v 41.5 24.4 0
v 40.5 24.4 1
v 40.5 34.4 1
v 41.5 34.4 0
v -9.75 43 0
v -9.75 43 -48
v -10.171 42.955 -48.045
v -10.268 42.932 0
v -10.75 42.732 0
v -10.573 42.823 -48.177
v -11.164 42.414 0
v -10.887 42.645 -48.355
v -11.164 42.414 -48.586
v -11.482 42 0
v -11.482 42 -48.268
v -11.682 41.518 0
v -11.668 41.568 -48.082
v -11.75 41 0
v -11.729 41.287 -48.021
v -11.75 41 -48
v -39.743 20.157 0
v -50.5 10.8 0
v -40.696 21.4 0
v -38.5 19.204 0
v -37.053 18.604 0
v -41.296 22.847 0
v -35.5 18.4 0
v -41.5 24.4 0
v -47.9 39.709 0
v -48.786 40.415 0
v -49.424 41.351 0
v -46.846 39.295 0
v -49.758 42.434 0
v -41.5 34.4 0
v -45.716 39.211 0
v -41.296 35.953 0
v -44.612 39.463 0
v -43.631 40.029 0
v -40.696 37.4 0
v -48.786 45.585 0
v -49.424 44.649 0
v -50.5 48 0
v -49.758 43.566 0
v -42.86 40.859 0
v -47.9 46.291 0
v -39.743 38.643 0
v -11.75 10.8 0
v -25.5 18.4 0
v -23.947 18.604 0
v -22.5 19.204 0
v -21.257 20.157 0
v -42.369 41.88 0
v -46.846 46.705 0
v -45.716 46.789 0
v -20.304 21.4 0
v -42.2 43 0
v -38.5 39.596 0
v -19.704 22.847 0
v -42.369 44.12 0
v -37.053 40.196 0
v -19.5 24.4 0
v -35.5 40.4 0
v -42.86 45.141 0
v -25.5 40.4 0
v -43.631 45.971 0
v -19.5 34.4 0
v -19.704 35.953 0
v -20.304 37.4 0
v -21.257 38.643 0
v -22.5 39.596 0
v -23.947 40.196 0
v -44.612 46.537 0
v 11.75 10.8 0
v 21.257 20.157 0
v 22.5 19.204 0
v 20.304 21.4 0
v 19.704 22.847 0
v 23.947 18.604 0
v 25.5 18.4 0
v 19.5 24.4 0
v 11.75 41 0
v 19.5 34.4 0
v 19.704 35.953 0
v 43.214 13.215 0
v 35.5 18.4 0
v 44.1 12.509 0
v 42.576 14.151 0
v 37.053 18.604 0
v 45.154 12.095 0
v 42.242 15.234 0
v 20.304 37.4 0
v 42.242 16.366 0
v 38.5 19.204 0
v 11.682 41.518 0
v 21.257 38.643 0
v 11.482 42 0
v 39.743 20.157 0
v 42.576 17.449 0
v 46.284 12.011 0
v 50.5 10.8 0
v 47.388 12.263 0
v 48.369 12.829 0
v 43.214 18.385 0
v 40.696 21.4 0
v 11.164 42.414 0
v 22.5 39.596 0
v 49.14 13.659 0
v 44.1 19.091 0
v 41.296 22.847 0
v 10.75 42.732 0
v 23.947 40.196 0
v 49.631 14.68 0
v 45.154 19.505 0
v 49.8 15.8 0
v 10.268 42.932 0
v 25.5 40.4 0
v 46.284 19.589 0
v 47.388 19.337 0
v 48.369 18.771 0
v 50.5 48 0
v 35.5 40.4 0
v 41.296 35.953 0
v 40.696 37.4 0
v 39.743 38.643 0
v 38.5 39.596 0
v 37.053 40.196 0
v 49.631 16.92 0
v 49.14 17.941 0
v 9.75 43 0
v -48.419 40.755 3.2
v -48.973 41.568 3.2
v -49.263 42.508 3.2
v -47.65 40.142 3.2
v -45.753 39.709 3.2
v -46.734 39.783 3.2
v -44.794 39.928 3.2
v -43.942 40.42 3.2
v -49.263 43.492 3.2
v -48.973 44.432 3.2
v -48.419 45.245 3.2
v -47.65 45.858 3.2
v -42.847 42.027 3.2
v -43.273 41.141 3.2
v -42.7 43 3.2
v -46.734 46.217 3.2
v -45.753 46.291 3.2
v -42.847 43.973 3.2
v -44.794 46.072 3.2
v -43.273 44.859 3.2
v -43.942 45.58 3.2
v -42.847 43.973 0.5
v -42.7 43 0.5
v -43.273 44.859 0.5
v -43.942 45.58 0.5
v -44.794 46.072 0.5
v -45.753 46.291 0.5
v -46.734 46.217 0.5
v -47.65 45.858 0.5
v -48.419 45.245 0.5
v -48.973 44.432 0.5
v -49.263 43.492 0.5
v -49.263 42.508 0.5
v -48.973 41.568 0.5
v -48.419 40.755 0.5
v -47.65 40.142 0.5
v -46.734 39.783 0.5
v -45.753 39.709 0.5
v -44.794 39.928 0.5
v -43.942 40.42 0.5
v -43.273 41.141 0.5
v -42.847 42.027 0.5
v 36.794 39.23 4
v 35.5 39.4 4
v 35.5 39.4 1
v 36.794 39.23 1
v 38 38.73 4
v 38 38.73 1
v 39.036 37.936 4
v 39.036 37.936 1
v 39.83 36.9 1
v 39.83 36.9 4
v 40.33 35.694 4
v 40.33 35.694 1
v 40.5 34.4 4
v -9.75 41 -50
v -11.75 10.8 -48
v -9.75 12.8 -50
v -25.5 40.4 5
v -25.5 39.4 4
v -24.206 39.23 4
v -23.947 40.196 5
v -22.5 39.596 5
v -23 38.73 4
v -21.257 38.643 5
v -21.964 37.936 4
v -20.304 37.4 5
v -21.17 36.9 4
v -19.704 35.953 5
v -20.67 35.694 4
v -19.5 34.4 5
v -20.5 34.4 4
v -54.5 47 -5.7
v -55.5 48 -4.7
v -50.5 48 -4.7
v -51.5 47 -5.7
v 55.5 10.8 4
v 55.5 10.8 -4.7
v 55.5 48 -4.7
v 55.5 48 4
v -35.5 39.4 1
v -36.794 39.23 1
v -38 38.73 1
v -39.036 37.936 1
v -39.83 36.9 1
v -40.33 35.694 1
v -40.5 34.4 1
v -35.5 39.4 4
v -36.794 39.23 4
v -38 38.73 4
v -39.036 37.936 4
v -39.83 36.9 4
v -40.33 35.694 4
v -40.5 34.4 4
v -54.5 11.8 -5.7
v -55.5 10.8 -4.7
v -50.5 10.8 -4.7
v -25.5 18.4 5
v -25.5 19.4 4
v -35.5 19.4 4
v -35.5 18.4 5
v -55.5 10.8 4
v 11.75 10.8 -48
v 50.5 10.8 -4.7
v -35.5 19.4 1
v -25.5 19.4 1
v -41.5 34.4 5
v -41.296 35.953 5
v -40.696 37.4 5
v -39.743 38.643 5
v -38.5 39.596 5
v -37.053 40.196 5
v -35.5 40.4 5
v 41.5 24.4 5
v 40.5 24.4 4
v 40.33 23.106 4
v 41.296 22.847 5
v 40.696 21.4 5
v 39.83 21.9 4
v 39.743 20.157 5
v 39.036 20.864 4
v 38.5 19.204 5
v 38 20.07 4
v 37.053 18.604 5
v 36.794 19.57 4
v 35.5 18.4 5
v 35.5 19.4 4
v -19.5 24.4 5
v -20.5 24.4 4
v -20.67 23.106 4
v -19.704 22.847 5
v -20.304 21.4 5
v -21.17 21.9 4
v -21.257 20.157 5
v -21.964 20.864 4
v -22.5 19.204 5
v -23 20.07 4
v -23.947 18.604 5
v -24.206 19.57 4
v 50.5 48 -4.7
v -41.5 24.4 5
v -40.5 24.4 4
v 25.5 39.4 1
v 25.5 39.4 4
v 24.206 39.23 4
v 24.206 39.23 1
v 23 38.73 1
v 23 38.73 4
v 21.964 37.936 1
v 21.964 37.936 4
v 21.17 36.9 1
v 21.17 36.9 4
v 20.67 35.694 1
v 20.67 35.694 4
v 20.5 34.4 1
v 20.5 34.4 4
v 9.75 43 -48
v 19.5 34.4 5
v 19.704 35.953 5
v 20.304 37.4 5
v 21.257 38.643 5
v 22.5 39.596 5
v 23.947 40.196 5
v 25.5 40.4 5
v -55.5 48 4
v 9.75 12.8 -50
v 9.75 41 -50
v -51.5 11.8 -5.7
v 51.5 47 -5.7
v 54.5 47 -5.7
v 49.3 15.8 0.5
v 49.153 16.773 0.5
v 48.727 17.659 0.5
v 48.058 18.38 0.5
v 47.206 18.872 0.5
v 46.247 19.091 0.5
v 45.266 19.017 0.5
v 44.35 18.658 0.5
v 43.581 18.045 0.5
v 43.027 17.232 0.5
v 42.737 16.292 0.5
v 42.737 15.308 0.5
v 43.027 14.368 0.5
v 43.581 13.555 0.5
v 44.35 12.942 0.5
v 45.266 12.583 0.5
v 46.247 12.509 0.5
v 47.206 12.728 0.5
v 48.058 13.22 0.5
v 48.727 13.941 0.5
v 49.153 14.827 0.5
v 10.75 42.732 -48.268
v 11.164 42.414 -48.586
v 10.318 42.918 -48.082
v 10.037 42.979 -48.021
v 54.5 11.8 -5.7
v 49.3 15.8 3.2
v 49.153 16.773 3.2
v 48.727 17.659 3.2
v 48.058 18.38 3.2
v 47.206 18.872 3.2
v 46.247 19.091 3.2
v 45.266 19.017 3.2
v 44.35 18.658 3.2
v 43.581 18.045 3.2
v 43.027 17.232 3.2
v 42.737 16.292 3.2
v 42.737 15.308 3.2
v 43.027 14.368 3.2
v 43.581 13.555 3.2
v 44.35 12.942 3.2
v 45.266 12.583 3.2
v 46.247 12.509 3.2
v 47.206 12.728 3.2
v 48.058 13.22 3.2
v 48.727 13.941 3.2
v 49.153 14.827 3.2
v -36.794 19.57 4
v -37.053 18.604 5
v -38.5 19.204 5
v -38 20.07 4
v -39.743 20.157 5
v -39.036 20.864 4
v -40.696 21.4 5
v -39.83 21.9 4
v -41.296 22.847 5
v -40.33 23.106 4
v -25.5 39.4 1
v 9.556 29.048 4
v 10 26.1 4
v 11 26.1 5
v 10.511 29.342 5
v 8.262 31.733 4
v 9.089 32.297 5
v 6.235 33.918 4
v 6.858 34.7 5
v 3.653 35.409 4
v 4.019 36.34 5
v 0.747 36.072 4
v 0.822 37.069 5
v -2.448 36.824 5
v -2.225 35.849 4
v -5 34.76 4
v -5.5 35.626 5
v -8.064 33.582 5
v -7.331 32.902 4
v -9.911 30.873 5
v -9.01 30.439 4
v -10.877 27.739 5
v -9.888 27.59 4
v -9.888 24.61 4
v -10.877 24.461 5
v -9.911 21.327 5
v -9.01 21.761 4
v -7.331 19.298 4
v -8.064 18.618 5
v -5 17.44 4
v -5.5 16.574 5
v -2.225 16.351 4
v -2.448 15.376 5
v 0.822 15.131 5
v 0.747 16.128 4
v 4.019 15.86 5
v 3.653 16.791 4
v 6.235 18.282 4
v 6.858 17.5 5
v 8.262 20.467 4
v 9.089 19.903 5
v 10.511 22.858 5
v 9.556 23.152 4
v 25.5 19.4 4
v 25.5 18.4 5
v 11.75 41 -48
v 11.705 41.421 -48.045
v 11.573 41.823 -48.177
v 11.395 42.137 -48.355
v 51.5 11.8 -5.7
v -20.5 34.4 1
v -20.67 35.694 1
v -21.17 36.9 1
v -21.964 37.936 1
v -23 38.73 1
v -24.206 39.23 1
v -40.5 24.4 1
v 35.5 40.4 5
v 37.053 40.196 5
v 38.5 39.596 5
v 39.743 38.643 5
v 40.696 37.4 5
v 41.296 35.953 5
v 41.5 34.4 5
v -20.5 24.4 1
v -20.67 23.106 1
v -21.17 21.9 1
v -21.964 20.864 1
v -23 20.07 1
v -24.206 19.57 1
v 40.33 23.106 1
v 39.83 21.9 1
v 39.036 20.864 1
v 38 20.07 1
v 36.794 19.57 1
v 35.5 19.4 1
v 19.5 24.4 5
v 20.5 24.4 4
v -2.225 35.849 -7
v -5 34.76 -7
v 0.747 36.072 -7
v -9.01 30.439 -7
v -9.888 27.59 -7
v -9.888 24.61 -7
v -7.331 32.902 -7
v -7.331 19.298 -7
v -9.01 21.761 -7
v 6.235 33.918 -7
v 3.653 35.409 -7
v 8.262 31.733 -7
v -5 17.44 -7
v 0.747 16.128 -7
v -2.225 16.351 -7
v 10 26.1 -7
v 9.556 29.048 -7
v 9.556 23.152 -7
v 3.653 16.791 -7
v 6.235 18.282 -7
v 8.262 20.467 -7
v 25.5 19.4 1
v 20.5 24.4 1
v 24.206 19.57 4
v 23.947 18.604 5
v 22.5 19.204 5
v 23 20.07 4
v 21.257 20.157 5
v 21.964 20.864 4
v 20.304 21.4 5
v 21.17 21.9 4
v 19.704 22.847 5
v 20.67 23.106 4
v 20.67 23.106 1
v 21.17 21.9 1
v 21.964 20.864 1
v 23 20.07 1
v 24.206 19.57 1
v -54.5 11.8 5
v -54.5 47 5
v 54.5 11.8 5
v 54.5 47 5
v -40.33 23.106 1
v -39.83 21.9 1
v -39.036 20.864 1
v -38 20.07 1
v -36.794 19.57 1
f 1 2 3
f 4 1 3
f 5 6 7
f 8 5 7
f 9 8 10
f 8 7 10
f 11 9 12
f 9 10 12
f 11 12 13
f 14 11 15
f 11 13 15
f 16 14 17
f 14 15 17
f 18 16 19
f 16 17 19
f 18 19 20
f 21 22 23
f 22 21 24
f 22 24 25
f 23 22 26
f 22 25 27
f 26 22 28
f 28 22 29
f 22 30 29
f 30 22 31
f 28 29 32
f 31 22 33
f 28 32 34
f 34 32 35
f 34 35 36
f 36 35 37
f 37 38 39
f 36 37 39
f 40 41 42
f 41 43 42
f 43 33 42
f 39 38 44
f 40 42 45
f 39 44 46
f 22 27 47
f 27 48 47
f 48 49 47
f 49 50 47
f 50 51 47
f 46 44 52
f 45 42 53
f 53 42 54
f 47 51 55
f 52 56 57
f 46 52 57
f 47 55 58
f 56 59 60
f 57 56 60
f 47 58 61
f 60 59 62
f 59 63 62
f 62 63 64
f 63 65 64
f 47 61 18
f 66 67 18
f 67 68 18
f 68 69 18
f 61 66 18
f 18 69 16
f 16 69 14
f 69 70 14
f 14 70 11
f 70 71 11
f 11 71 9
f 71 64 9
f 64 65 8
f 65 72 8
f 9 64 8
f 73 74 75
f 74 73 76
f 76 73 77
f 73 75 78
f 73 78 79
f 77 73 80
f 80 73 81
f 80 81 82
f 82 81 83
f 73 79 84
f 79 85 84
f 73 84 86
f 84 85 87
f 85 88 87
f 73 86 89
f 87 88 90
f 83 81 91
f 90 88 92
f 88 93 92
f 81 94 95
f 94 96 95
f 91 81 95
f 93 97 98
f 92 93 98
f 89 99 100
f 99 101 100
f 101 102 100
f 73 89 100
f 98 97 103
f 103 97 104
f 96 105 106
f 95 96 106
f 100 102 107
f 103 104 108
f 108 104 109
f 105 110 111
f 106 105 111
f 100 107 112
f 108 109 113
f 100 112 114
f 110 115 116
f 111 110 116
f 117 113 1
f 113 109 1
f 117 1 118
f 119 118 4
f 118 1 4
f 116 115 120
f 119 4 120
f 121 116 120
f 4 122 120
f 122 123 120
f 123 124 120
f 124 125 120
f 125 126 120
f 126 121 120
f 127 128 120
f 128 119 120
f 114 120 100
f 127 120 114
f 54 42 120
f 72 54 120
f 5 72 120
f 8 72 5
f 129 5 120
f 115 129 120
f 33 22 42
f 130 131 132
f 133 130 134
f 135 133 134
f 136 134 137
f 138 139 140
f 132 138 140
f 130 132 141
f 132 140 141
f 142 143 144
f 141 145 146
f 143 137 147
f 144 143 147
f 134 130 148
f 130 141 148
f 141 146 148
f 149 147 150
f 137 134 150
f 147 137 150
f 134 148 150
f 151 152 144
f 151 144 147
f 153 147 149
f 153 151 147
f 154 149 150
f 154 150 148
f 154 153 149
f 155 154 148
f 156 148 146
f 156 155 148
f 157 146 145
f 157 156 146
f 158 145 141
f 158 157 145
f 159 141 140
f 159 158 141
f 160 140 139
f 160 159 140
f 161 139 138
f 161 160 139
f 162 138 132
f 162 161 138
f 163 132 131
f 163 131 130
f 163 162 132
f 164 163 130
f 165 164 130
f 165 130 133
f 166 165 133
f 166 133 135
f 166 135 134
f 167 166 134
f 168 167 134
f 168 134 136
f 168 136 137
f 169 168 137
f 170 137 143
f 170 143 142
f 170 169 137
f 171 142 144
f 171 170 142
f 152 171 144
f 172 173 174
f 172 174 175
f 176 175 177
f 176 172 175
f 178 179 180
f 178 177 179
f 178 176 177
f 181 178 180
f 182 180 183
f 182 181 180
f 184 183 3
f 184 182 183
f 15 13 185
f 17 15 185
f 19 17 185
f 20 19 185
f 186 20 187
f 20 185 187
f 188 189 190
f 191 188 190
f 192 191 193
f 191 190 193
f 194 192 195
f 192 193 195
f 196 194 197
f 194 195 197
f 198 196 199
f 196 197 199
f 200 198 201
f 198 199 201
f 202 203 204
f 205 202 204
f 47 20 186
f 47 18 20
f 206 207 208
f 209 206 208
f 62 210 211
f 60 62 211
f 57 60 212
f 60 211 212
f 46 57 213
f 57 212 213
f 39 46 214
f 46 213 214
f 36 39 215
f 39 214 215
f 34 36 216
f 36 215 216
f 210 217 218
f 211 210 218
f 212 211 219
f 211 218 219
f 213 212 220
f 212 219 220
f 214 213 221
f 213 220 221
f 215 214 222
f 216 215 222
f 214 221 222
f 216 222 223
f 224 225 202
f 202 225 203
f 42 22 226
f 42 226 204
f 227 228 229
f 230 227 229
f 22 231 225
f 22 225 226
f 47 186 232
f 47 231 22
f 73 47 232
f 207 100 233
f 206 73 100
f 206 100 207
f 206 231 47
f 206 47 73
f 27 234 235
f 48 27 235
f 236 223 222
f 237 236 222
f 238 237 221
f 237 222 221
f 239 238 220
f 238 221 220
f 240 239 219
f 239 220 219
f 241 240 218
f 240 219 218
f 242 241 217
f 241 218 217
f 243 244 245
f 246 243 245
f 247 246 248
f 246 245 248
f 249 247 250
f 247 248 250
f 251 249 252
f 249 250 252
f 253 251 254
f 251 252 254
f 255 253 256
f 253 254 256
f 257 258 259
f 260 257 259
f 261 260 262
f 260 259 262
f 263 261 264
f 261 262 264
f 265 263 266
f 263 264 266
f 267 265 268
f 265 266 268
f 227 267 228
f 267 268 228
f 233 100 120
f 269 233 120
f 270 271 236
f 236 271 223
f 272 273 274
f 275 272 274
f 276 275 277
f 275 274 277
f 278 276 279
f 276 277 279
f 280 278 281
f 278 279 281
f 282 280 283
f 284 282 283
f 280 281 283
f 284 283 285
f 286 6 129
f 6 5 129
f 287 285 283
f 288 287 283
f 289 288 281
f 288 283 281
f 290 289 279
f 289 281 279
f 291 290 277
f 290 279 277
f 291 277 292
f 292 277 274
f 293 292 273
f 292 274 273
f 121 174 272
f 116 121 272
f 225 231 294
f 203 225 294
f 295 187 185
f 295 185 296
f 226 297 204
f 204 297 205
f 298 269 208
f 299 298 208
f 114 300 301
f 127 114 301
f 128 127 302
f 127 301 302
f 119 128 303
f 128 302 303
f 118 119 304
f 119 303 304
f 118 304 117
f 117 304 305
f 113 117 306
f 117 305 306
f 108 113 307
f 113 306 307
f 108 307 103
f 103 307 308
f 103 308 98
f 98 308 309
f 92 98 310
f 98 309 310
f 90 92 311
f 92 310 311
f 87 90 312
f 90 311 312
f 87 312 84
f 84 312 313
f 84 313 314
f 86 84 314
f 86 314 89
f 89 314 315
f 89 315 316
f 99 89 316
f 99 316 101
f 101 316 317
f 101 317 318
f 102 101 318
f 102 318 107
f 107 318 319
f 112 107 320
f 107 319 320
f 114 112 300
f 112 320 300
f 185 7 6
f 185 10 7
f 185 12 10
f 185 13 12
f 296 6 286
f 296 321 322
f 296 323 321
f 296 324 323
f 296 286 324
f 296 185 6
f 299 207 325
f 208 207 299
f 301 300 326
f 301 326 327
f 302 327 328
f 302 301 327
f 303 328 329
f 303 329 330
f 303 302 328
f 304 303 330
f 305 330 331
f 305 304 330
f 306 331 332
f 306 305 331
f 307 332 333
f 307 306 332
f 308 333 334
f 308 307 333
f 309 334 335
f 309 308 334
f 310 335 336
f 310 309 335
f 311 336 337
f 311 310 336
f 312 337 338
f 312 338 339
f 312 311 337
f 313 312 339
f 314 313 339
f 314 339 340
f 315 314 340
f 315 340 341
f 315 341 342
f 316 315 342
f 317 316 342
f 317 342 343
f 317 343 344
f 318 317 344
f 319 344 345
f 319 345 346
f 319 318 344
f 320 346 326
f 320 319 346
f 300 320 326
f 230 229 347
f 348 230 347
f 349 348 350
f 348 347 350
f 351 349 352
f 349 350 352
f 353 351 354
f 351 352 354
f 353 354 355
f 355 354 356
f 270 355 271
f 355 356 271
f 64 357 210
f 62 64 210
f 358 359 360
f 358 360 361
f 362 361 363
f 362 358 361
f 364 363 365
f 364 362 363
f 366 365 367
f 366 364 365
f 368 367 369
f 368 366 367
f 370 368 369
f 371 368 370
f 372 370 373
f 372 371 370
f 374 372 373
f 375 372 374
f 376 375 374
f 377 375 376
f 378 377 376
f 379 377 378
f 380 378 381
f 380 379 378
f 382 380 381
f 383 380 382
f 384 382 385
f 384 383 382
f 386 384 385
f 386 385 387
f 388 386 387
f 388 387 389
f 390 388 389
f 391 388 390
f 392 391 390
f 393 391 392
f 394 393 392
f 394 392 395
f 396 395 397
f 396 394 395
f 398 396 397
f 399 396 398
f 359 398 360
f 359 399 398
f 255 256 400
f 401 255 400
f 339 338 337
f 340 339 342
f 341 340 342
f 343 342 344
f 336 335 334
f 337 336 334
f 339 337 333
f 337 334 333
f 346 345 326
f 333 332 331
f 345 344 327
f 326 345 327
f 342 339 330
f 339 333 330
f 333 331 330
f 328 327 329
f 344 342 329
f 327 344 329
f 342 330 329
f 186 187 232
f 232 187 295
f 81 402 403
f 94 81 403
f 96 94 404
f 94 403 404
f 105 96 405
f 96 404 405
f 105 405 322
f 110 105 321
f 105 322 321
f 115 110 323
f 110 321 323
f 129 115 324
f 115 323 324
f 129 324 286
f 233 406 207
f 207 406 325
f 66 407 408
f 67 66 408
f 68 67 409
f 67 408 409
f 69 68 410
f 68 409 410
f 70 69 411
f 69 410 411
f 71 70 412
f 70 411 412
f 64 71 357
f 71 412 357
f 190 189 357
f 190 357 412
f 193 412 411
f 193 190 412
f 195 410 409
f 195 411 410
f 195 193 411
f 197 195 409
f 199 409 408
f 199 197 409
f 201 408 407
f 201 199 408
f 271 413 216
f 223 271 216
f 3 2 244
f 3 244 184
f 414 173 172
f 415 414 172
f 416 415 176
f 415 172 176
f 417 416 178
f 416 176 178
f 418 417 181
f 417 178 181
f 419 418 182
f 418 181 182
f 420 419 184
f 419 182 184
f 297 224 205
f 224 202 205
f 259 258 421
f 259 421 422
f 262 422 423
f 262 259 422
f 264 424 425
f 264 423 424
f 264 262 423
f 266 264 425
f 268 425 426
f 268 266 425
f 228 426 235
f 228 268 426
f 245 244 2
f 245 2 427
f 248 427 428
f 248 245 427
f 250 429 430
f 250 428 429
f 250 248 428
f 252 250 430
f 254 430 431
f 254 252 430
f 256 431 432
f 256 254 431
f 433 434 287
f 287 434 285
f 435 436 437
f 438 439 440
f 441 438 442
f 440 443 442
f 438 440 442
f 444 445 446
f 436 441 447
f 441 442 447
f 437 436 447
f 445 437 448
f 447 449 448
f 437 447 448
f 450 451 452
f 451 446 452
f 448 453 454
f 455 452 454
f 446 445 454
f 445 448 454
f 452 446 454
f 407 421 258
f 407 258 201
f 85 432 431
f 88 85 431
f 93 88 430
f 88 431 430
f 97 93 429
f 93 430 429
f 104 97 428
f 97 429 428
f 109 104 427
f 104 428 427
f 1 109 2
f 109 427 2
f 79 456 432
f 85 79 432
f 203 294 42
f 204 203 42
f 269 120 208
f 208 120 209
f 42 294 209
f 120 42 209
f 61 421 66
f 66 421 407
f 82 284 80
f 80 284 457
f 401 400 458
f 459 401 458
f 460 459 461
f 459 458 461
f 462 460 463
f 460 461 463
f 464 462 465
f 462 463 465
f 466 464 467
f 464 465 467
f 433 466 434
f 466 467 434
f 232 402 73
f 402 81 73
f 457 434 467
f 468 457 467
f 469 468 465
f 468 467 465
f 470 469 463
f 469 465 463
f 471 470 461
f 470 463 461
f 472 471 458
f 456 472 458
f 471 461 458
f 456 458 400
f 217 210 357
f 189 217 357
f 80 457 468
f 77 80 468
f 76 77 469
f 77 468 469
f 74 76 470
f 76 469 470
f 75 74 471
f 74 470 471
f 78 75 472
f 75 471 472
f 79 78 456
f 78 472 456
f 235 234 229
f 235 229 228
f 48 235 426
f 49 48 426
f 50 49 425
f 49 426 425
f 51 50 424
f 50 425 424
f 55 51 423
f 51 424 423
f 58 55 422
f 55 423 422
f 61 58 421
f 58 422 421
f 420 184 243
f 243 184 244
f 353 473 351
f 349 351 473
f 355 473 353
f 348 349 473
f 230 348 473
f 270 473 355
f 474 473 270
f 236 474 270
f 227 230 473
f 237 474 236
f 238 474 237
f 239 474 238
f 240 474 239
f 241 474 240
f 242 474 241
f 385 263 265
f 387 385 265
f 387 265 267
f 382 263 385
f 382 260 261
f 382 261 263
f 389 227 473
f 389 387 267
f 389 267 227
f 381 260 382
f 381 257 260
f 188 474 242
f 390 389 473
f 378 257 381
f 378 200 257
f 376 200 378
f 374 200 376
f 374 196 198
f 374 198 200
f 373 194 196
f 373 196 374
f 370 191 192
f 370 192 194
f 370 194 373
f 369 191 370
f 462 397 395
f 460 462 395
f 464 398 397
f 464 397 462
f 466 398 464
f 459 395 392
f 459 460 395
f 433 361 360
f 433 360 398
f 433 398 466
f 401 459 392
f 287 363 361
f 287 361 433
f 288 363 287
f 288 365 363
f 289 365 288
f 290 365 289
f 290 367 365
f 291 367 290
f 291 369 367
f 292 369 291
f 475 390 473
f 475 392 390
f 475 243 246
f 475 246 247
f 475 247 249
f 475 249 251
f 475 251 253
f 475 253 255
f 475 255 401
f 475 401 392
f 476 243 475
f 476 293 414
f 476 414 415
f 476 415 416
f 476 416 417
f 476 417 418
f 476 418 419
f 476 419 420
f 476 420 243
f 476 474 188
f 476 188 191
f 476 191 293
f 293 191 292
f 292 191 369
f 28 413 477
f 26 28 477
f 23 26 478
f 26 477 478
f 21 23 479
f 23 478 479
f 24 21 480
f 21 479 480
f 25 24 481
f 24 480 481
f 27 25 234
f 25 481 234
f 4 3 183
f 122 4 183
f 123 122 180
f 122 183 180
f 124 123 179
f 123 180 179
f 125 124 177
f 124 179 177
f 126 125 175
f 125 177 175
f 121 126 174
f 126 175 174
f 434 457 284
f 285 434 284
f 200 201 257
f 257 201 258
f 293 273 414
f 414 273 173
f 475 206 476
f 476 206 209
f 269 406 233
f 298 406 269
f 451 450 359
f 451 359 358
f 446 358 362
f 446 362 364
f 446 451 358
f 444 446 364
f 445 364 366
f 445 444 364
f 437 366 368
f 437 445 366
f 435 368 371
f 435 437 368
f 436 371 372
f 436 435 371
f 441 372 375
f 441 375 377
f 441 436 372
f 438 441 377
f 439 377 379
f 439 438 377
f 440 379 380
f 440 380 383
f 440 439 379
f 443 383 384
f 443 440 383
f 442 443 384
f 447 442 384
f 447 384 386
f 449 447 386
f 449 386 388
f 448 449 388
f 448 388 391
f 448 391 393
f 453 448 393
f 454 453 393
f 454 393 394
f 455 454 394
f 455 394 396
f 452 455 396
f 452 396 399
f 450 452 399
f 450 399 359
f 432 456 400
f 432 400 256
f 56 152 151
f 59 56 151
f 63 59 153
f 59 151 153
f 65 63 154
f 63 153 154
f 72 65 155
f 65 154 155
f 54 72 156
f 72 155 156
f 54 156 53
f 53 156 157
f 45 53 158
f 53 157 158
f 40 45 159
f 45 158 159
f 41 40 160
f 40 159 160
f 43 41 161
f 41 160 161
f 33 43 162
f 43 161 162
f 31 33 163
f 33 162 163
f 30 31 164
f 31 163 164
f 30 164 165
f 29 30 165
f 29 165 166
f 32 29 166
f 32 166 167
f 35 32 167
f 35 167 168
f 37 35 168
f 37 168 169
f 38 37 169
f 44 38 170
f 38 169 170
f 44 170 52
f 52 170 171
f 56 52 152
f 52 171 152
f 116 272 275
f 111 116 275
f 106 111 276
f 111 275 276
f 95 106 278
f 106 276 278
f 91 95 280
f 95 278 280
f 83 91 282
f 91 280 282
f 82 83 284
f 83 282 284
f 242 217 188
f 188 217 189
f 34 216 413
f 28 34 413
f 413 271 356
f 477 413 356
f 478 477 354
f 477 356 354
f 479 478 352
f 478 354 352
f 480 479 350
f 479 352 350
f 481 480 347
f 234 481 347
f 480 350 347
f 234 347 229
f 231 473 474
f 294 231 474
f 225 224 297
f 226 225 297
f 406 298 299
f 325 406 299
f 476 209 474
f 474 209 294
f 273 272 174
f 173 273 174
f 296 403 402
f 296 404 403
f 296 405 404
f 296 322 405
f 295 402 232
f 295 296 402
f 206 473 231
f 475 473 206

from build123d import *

# Parameters (mm, degrees)
F0_W      = 5
F0_H      = 37.2
F0_W_2    = 20
F0_H_2    = 20
F0_W_3    = 23.5
F0_H_3    = 32.2
F0_R      = 10
F1_DEPTH  = 5
F2_DEPTH  = 5.7
F3_DEPTH  = 7
F4_W      = 23.5
F4_H      = 32.2
F4_R      = 10
F5_DEPTH  = 43
F6_R      = 5
F7_SIZE   = 2
F8_SIZE   = 1
F9_SIZE   = 1
F10_SIZE  = 1
F11_R     = 2
F12_R     = 3.3
F13_DEPTH = 3.2
F14_SIZE  = 0.5


with BuildPart() as f1:
    # F0 (on Top) → F1 (new body)
    with BuildSketch(Plane.XY):
        with Locations((-53, 29.4)):
            Rectangle(F0_W, F0_H)
        Polygon((-50.5, 48), (-50.5, 10.8), (-11.75, 10.8), (-11.75, 43), (11.75, 43), (11.75, 10.8), (50.5, 10.8), (50.5, 48), (5, 48), (-5, 48), align=None)
        with Locations((-30.5, 29.4)):
            Rectangle(F0_W_2, F0_H_2, mode=Mode.SUBTRACT)
        with Locations((30.5, 29.4)):
            Rectangle(F0_W_2, F0_H_2, mode=Mode.SUBTRACT)
        with Locations((0, 26.9)):
            Rectangle(F0_W_3, F0_H_3)
        with Locations((0, 26.1)):
            Circle(F0_R, mode=Mode.SUBTRACT)
        with Locations((53, 29.4)):
            Rectangle(F0_W, F0_H)
    extrude(amount=F1_DEPTH)

    # F0 (on Top) → F2 (join)
    with BuildSketch(Plane.XY):
        with Locations((-53, 29.4)):
            Rectangle(F0_W, F0_H)
        with Locations((53, 29.4)):
            Rectangle(F0_W, F0_H)
    extrude(amount=-F2_DEPTH)

    # F0 (on Top) → F3 (join)
    with BuildSketch(Plane.XY):
        with Locations((0, 26.9)):
            Rectangle(F0_W_3, F0_H_3)
        with Locations((0, 26.1)):
            Circle(F0_R, mode=Mode.SUBTRACT)
    extrude(amount=-F3_DEPTH)

    # F4 (on face) → F5 (join)
    with BuildSketch(Plane(origin=(0, 0, -7), x_dir=(1, 0, 0), z_dir=(0, 0, -1))):
        with Locations((0, -26.9)):
            Rectangle(F4_W, F4_H)
        with Locations((0, -26.1)):
            Circle(F4_R, mode=Mode.SUBTRACT)
        with Locations((0, -26.1)):
            Circle(F4_R)
    extrude(amount=F5_DEPTH)

    # F6
    f6_edges = [f1.edges().sort_by_distance(p)[0] for p in [
        (20.5, 39.4, 2.5),
        (40.5, 39.4, 2.5),
        (20.5, 19.4, 2.5),
        (40.5, 19.4, 2.5),
        (-20.5, 39.4, 2.5),
        (-40.5, 39.4, 2.5),
        (-40.5, 19.4, 2.5),
        (-20.5, 19.4, 2.5),
    ]]
    fillet(f6_edges, radius=F6_R)

    # F7
    f7_edges = [f1.edges().sort_by_distance(p)[0] for p in [
        (0, 10.8, -50),
        (-11.75, 26.9, -50),
        (0, 43, -50),
        (11.75, 26.9, -50),
    ]]
    chamfer(f7_edges, length=F7_SIZE)

    # F8
    f8_edges = [f1.edges().sort_by_distance(p)[0] for p in [
        (55.5, 29.4, -5.7),
        (53, 48, -5.7),
        (50.5, 29.4, -5.7),
        (53, 10.8, -5.7),
        (-53, 10.8, -5.7),
        (-50.5, 29.4, -5.7),
        (-53, 48, -5.7),
        (-55.5, 29.4, -5.7),
    ]]
    chamfer(f8_edges, length=F8_SIZE)

    # F9
    f9_edges = [f1.edges().sort_by_distance(p)[0] for p in [
        (-10, 26.1, 5),
        (20.5, 29.4, 5),
        (21.964466, 20.864466, 5),
        (21.964466, 37.935534, 5),
        (30.5, 19.4, 5),
        (30.5, 39.4, 5),
        (39.035534, 20.864466, 5),
        (39.035534, 37.935534, 5),
        (40.5, 29.4, 5),
        (0, 10.8, 5),
        (55.5, 29.4, 5),
        (0, 48, 5),
        (-55.5, 29.4, 5),
        (-40.5, 29.4, 5),
        (-39.035534, 20.864466, 5),
        (-39.035534, 37.935534, 5),
        (-30.5, 19.4, 5),
        (-30.5, 39.4, 5),
        (-21.964466, 20.864466, 5),
        (-21.964466, 37.935534, 5),
        (-20.5, 29.4, 5),
    ]]
    chamfer(f9_edges, length=F9_SIZE)

    # F10
    f10_edges = [f1.edges().sort_by_distance(p)[0] for p in [
        (-30.5, 19.4, 0),
        (-20.5, 29.4, 0),
        (-30.5, 39.4, 0),
        (-40.5, 29.4, 0),
        (30.5, 19.4, 0),
        (20.5, 29.4, 0),
        (30.5, 39.4, 0),
        (40.5, 29.4, 0),
        (-39.035534, 20.864466, 0),
        (-39.035534, 37.935534, 0),
        (-21.964466, 20.864466, 0),
        (-21.964466, 37.935534, 0),
        (21.964466, 20.864466, 0),
        (21.964466, 37.935534, 0),
        (39.035534, 20.864466, 0),
        (39.035534, 37.935534, 0),
    ]]
    chamfer(f10_edges, length=F10_SIZE)

    # F11
    f11_edges = [f1.edges().sort_by_distance(p)[0] for p in [
        (-11.75, 43, -24),
        (11.75, 43, -24),
    ]]
    fillet(f11_edges, radius=F11_R)

    # F12 (on face) → F13 (cut)
    with BuildSketch(Plane.XY):
        with Locations((-46, 43)):
            Circle(F12_R)
        with Locations((46, 15.8)):
            Circle(F12_R)
    extrude(amount=F13_DEPTH, mode=Mode.SUBTRACT)

    # F14
    f14_edges = [f1.edges().sort_by_distance(p)[0] for p in [
        (-49.3, 43, 0),
        (42.7, 15.8, 0),
    ]]
    chamfer(f14_edges, length=F14_SIZE)


solid = f1.part
